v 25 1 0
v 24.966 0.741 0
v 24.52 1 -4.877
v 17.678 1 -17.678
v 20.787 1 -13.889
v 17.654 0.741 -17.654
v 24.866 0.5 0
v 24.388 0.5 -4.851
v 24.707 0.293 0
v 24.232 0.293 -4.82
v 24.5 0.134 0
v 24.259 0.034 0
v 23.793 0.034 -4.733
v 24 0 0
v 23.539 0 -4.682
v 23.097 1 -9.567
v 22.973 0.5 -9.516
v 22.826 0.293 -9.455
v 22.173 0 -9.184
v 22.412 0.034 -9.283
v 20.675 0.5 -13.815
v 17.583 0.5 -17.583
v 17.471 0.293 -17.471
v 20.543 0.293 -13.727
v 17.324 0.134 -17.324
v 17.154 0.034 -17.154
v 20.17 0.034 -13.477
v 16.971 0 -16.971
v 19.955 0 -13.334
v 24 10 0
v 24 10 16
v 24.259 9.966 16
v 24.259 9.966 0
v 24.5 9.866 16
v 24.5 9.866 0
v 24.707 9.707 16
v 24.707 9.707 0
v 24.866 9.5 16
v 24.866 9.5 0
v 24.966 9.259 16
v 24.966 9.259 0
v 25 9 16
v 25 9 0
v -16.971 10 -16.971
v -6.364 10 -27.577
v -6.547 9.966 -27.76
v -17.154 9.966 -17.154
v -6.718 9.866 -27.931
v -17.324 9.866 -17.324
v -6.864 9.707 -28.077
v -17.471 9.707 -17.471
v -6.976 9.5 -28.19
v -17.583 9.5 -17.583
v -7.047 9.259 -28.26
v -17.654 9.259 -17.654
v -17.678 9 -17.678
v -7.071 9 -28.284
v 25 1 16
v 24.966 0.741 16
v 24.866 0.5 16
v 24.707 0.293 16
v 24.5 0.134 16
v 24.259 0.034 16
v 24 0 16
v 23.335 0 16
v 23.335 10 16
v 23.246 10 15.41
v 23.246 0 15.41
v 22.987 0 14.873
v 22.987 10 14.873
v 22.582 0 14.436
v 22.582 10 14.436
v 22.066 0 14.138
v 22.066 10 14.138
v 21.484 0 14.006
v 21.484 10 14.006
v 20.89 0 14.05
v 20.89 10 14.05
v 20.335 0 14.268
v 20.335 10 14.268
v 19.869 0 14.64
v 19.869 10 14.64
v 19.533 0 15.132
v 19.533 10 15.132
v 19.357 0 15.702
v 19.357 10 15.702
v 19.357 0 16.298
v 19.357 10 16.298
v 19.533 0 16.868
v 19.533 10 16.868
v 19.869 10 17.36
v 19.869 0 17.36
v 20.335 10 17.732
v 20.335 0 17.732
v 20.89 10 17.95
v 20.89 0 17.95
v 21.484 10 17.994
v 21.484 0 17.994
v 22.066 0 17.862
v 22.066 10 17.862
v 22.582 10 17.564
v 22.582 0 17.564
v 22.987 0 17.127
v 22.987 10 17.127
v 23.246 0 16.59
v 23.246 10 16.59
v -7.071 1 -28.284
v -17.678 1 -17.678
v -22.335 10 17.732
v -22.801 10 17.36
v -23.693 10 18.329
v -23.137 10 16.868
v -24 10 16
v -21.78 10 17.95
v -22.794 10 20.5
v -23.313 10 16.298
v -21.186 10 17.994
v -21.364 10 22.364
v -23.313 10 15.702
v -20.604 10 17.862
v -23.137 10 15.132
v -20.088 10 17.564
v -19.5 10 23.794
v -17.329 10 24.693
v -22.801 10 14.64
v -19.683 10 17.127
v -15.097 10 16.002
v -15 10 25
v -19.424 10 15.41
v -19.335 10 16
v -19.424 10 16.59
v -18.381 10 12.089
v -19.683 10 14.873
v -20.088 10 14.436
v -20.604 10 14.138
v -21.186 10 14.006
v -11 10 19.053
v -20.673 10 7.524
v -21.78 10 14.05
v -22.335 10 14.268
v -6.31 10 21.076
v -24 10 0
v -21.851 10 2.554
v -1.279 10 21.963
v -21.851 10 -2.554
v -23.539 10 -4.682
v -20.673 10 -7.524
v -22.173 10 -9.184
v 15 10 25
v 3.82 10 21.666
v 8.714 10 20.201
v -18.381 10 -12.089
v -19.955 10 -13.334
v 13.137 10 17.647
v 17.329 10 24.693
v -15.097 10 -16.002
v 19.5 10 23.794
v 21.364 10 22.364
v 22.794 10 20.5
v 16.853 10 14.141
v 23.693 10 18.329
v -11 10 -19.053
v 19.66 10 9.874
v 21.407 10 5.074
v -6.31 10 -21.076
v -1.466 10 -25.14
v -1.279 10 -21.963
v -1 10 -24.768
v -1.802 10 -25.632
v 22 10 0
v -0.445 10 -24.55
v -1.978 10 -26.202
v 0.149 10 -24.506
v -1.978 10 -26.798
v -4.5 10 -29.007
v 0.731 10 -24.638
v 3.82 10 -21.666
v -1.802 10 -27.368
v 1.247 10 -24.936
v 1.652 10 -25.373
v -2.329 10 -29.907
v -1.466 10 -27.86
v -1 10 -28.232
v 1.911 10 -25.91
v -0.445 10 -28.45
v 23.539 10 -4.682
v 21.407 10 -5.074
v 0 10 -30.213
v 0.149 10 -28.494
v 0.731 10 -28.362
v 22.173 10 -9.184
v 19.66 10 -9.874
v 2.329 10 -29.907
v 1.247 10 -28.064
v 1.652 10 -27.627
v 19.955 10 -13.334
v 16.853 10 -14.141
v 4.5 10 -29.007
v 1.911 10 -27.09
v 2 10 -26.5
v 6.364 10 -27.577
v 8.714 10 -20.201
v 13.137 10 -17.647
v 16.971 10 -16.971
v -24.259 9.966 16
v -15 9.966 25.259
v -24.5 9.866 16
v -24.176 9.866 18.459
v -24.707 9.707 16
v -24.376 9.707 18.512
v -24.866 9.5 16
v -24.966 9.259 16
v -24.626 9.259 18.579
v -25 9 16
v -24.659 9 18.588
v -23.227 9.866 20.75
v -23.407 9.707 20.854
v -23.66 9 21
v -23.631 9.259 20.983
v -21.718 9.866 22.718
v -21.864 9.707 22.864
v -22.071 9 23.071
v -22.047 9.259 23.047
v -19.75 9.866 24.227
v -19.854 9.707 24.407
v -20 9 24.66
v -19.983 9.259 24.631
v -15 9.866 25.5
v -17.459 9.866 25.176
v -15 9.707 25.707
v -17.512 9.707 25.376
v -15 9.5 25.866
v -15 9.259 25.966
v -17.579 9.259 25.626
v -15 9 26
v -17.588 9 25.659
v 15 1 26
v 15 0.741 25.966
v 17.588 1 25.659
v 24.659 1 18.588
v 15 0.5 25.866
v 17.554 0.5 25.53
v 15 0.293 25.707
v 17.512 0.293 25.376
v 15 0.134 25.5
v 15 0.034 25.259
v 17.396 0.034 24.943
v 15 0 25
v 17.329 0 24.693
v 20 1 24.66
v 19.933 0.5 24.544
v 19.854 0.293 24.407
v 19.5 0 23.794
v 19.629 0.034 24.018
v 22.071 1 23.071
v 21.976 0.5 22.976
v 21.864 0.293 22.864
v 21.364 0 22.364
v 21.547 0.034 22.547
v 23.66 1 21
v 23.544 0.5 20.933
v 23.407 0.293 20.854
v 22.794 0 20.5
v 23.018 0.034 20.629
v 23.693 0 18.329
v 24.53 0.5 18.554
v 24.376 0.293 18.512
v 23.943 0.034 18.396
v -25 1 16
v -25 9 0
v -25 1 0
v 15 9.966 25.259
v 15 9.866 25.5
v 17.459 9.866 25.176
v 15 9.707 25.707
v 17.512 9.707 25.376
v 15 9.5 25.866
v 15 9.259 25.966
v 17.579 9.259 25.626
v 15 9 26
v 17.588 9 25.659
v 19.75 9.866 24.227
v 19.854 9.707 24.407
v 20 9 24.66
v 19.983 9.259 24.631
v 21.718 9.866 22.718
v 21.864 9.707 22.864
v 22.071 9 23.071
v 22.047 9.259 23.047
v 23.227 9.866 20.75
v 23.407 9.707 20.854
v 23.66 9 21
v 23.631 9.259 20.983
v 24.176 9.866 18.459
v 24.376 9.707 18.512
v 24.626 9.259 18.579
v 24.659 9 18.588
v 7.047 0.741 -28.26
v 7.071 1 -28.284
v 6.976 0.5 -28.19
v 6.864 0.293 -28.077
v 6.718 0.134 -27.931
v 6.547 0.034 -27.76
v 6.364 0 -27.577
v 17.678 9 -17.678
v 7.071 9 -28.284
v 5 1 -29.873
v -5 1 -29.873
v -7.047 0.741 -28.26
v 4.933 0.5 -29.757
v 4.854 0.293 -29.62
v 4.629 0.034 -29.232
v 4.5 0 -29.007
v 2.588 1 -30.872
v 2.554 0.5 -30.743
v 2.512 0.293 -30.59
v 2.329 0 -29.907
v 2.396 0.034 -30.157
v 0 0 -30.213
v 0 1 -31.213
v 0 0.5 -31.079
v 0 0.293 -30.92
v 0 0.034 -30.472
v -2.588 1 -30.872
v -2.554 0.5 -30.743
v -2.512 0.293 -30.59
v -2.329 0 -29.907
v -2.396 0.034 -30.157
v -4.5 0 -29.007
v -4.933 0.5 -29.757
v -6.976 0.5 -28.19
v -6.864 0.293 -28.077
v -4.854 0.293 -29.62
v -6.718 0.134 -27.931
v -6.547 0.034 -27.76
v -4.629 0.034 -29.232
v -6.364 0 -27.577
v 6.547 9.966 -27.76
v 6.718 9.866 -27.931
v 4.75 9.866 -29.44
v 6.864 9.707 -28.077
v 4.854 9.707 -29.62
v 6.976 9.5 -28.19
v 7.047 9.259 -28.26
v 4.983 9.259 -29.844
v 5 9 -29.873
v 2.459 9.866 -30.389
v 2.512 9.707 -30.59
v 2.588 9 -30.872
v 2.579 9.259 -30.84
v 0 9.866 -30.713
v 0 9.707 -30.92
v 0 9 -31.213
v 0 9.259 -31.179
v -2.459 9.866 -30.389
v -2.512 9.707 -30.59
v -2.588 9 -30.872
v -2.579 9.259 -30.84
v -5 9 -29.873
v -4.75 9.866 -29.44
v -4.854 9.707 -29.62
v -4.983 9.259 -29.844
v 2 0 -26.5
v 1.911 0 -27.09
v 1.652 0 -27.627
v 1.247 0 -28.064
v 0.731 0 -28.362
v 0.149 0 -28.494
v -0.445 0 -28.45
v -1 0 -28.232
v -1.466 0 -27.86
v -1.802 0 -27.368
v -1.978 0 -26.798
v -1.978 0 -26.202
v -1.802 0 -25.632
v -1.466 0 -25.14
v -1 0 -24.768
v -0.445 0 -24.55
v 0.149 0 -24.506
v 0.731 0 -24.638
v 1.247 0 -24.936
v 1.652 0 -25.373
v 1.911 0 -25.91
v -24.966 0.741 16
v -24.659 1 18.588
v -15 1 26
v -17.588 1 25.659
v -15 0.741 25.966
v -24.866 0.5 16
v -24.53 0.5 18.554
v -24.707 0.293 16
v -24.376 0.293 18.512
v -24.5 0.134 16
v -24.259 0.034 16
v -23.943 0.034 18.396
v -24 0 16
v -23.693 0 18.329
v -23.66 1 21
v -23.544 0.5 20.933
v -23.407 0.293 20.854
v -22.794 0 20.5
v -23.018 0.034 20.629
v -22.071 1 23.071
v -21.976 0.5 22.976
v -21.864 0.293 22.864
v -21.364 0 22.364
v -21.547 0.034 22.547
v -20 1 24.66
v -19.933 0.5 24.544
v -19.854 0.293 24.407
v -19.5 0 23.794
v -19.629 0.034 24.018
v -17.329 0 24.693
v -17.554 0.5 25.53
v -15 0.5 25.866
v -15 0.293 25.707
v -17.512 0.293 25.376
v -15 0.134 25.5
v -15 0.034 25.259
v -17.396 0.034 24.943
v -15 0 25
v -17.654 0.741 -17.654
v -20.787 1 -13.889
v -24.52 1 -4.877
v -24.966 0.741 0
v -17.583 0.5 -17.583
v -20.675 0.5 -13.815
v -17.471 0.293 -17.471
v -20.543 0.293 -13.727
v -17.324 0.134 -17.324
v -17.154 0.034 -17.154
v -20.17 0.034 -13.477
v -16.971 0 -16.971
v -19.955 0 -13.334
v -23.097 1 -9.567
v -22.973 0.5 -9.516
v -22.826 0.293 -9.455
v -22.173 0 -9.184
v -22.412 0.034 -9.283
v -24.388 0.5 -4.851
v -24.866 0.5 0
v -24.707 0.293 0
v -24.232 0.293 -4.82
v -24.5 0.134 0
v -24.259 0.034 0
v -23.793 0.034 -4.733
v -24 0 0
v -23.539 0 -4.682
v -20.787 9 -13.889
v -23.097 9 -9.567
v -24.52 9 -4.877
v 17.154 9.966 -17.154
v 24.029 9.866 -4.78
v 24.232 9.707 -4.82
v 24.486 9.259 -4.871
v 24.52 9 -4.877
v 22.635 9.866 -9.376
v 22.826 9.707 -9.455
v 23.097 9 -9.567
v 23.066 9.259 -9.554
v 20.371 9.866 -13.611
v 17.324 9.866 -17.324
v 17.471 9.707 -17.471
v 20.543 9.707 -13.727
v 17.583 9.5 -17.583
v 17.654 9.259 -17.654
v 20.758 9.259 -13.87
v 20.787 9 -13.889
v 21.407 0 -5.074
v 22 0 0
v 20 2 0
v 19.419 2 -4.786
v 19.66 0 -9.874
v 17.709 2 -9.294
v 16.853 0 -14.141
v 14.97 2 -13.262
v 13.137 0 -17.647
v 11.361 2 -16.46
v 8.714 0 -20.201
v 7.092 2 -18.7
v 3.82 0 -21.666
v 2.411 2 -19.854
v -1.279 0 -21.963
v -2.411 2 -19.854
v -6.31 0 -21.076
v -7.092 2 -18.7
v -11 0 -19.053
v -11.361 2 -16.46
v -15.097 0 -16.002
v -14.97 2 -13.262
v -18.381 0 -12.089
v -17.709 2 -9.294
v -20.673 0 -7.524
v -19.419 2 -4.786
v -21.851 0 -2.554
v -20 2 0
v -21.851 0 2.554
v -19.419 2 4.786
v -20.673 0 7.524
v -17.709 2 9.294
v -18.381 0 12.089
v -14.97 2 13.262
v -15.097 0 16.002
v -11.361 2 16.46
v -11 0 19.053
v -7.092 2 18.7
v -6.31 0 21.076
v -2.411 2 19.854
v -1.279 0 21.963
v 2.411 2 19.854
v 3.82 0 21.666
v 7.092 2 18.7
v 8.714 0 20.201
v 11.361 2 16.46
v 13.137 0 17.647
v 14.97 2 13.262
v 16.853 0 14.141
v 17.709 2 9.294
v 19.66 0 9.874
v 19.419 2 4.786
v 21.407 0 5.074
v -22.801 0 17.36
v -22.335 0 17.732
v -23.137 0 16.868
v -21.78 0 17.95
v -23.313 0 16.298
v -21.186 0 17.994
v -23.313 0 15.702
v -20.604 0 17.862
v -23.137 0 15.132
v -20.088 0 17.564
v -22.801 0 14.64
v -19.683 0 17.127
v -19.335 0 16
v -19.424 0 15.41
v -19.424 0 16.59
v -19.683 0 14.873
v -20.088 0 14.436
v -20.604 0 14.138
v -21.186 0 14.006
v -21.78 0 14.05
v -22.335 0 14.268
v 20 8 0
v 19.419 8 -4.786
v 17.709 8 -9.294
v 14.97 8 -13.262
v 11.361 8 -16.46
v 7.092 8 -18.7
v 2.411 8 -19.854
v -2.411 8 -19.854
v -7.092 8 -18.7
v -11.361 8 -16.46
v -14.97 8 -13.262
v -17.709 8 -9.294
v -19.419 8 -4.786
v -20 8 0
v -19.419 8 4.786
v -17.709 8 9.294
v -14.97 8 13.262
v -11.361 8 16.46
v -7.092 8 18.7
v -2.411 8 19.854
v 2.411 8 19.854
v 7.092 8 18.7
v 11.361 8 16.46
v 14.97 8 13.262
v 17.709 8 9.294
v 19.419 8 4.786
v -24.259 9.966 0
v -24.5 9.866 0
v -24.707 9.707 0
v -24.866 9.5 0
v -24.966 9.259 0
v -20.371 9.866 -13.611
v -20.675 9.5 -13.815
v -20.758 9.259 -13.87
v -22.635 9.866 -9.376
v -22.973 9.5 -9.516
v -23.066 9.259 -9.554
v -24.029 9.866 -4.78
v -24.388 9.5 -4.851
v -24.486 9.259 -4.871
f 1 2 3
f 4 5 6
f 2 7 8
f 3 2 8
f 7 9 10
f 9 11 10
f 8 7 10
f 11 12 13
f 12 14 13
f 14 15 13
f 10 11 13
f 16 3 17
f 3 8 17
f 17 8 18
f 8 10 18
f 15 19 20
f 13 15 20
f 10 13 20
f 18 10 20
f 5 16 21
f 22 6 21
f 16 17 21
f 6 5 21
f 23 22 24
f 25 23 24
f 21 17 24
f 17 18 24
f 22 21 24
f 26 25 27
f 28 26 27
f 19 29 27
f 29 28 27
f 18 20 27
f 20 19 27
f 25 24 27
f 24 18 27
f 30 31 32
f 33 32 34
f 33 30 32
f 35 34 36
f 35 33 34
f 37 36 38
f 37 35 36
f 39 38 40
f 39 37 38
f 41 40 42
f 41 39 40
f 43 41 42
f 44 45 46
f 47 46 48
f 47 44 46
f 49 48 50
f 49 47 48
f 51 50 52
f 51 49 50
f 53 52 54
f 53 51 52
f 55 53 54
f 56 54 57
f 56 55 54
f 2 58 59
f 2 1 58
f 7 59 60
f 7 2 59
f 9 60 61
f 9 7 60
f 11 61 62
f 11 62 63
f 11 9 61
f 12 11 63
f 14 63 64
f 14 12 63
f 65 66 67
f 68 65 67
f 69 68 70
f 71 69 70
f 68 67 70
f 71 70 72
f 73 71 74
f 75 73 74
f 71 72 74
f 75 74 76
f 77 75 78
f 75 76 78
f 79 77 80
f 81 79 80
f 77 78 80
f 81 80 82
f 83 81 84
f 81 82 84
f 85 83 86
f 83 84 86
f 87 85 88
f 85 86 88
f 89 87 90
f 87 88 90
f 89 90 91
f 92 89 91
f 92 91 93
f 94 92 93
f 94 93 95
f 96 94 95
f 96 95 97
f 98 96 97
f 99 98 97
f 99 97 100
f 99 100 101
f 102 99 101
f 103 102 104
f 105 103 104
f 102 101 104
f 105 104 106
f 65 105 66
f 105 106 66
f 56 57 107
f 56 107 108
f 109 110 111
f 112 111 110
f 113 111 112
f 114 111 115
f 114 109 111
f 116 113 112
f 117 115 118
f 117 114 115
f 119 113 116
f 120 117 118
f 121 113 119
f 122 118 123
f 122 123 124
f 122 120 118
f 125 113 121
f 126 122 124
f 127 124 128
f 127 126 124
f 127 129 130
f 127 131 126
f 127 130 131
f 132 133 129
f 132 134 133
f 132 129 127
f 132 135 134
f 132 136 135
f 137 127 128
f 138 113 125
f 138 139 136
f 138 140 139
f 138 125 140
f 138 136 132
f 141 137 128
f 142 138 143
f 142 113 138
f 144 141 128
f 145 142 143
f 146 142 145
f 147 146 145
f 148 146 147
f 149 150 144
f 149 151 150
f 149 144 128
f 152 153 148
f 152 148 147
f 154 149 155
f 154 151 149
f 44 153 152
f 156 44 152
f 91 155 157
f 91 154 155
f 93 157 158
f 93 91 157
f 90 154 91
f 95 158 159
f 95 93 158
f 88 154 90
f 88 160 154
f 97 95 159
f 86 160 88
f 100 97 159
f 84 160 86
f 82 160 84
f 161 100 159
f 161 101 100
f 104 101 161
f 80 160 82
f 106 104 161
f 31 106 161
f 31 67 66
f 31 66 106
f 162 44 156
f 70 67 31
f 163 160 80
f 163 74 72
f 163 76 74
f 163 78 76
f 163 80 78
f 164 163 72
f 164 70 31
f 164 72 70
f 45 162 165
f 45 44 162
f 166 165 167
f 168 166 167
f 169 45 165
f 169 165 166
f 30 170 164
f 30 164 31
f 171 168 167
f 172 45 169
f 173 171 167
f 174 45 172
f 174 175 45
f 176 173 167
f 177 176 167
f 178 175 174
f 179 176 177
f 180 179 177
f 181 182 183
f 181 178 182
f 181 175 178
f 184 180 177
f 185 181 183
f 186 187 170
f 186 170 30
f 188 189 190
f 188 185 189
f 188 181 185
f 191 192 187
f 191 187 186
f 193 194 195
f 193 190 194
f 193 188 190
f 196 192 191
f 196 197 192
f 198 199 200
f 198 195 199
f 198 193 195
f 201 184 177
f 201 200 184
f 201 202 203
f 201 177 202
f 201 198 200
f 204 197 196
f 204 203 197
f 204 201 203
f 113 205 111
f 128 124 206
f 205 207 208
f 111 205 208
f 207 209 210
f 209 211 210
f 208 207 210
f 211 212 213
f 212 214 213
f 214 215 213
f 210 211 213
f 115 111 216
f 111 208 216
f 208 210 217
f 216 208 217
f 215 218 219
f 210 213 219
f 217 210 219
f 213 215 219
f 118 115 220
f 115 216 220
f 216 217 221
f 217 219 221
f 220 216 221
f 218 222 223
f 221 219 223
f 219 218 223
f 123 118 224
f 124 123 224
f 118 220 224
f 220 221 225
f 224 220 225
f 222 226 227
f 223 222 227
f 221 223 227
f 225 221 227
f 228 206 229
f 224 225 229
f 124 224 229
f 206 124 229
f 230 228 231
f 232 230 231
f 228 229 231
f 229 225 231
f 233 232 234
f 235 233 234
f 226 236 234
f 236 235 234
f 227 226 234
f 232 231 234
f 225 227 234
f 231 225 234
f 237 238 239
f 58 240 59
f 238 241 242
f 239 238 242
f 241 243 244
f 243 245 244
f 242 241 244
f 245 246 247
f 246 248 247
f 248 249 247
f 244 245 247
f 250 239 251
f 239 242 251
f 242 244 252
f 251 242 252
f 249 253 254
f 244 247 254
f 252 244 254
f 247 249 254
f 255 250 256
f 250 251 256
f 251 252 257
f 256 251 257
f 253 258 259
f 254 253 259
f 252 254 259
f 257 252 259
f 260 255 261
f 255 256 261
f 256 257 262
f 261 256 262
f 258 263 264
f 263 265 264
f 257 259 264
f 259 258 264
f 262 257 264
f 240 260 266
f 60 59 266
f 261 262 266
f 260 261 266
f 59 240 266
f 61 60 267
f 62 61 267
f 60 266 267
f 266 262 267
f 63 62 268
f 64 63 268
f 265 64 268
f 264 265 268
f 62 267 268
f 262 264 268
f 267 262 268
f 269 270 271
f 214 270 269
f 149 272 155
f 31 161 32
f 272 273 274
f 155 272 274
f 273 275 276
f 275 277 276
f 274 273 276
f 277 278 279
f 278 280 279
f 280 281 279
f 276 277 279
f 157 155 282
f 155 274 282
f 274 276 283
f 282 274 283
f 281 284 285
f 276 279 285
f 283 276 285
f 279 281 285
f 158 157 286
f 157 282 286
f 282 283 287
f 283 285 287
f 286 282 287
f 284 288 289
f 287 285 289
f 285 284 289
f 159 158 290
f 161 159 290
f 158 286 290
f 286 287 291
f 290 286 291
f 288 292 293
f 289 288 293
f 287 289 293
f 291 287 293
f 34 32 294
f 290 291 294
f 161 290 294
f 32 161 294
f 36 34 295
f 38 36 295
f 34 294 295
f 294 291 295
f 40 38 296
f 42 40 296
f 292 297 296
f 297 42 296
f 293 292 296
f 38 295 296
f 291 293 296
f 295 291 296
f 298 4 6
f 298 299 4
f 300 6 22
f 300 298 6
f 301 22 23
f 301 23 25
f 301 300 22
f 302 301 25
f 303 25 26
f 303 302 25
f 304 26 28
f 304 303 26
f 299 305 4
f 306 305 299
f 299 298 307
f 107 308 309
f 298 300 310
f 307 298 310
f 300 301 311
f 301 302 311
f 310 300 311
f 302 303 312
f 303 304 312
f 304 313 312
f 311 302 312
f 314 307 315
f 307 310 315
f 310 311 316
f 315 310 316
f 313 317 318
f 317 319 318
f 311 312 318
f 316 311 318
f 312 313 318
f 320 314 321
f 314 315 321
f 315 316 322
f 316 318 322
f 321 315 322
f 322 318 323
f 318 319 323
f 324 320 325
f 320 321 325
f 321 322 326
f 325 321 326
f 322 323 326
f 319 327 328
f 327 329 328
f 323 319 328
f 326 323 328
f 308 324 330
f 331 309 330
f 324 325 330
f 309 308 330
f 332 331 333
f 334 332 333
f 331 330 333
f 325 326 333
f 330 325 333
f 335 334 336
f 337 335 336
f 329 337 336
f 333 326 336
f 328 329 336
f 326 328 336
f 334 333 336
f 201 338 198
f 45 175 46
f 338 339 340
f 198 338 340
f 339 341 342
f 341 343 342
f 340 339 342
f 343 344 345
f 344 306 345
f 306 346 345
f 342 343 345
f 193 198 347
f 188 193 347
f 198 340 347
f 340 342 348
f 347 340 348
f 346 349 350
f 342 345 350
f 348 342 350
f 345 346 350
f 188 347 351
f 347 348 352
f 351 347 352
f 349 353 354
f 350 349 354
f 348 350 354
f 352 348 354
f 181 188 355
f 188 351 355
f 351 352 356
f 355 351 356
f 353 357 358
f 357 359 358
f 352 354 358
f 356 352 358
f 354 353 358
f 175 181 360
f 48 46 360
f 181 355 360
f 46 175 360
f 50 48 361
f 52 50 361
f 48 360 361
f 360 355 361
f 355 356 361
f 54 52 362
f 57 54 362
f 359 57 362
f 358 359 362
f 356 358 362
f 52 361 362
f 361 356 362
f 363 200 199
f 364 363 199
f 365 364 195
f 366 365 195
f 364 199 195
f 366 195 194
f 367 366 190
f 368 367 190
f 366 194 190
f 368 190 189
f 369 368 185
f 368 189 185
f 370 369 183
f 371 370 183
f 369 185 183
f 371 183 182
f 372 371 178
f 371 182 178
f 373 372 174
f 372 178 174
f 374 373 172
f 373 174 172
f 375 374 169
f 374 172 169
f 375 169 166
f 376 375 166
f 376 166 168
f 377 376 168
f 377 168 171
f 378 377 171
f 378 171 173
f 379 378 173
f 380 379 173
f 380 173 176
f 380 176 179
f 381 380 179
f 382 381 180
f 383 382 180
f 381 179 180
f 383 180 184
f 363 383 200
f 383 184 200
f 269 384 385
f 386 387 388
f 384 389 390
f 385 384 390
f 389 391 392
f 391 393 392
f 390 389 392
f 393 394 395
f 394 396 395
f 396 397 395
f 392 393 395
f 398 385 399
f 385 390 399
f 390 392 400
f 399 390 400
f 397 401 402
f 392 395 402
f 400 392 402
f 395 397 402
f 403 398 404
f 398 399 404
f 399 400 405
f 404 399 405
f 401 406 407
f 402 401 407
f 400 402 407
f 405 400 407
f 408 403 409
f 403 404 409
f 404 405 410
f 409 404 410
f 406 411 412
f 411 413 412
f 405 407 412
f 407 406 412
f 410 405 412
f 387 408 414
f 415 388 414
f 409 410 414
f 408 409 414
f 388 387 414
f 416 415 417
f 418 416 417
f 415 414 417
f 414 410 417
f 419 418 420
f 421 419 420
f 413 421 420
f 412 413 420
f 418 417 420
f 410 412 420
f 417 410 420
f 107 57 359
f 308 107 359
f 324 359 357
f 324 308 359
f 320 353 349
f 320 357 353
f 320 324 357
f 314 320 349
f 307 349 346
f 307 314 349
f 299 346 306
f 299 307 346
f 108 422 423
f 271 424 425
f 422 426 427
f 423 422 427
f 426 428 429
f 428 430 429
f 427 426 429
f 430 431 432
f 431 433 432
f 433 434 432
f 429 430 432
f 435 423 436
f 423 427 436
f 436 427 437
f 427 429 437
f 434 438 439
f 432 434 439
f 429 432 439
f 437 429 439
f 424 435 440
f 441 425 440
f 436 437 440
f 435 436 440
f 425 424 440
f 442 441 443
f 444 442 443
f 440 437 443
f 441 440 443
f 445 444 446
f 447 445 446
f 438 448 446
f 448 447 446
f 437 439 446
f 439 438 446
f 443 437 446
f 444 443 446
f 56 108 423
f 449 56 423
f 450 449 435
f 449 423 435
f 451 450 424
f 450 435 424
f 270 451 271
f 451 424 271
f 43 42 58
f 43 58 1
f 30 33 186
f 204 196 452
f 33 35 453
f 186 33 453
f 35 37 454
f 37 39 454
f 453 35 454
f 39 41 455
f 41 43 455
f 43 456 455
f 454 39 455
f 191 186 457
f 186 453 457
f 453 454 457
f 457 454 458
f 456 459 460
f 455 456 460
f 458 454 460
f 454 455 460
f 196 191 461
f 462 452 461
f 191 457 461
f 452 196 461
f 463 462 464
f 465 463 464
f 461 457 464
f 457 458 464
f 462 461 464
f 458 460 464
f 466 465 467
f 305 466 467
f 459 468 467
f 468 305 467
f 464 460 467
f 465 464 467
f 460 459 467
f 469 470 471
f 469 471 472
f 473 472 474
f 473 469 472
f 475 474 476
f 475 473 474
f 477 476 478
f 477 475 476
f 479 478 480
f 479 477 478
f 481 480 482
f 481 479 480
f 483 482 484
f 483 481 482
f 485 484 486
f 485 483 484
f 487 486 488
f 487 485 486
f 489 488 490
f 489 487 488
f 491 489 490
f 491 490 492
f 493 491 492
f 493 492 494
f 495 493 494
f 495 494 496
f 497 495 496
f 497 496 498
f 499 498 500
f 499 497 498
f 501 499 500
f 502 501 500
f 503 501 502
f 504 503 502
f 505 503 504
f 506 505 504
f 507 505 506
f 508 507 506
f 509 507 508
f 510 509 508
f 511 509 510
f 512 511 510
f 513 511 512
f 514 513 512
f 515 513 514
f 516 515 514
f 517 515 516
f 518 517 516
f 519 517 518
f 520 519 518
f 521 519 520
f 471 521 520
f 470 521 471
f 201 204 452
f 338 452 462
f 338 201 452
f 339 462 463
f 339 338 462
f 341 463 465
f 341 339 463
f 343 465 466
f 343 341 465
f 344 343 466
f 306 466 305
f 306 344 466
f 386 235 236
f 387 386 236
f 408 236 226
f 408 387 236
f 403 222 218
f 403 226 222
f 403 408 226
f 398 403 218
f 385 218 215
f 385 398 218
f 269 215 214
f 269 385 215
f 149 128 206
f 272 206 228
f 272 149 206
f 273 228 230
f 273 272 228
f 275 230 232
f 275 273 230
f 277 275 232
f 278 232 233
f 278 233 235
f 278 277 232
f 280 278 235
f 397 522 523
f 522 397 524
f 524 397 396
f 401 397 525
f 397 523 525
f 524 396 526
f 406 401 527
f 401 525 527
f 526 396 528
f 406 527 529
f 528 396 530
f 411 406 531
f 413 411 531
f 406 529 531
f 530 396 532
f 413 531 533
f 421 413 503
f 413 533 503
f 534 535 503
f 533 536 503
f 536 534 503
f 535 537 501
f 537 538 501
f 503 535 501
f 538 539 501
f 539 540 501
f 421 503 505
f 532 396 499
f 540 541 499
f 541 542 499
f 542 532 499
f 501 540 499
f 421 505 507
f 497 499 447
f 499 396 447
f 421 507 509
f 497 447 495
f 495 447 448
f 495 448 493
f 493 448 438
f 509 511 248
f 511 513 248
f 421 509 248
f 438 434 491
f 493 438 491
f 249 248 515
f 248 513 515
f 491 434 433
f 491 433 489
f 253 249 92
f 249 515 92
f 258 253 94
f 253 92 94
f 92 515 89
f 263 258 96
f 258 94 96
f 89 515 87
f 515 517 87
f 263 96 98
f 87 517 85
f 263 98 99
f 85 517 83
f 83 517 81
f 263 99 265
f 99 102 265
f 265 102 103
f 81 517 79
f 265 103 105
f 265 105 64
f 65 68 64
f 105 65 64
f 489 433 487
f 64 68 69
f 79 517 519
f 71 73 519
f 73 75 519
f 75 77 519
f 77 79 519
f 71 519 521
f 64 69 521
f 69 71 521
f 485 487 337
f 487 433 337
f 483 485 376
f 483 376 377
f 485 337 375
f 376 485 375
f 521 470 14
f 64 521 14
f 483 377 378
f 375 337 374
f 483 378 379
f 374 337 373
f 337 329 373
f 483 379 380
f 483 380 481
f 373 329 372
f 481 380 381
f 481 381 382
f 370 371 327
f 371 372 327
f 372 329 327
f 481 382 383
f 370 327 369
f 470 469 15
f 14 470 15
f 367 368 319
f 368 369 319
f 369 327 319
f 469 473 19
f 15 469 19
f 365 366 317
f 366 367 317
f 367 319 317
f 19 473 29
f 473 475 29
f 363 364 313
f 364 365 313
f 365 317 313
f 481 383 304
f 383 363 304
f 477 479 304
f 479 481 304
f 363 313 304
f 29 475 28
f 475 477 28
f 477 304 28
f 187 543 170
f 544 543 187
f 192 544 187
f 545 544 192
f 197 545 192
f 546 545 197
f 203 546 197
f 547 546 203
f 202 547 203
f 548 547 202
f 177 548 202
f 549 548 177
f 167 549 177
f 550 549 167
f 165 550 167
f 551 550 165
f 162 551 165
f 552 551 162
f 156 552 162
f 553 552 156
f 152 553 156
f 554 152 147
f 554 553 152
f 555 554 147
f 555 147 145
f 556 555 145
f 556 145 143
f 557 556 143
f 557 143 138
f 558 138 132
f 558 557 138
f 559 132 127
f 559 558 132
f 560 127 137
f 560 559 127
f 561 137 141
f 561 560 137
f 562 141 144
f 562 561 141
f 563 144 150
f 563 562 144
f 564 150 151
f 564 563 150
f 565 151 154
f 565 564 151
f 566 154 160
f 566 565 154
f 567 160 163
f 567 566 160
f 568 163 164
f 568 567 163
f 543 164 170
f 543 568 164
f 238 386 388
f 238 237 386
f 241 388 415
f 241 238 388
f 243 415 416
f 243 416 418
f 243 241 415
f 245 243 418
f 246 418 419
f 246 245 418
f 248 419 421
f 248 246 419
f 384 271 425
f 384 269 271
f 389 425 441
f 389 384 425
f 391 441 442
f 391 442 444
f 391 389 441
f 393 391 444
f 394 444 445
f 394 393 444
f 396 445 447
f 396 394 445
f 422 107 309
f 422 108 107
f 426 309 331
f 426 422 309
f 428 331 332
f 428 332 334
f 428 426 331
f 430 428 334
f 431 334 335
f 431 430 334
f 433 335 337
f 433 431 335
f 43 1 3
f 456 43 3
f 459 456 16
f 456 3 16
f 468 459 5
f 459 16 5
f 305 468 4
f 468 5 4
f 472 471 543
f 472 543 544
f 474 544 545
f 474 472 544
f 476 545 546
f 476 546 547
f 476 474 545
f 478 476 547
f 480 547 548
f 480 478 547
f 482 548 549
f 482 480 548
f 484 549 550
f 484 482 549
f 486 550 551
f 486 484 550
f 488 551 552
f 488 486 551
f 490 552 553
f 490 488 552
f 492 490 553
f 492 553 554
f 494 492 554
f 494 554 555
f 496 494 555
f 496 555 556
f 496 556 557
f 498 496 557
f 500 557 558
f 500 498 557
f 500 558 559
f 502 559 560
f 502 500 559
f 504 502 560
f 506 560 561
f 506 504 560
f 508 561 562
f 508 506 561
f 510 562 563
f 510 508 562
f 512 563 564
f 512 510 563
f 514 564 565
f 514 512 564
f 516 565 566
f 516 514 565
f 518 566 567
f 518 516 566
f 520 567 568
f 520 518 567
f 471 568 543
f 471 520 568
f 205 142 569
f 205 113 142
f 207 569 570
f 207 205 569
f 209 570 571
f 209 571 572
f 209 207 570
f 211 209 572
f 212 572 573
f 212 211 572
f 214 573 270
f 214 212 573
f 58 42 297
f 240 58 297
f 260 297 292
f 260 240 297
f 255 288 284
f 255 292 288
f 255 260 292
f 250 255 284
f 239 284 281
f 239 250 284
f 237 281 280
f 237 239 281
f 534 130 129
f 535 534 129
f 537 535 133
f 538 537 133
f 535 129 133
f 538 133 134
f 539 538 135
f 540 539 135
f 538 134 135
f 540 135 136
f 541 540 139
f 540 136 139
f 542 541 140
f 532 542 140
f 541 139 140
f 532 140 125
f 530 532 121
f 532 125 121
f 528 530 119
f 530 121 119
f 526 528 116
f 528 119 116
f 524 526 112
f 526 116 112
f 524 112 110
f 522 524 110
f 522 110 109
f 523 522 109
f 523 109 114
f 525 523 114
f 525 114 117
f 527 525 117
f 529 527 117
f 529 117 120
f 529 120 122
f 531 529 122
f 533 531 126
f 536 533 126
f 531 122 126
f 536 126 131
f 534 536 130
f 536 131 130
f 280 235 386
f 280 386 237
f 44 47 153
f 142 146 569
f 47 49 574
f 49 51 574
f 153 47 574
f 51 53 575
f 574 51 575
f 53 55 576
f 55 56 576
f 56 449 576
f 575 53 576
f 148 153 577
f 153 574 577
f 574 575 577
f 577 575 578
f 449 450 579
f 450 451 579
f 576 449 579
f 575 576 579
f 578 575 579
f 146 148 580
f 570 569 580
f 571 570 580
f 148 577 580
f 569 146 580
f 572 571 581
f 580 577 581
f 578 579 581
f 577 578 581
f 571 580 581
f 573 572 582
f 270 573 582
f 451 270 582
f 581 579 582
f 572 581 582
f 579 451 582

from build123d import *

# Parameters (mm, degrees)
SKETCH1_R           = 25
SKETCH1_R_2         = 20
BOSS_EXTRUDE1_DEPTH = 10
BOSS_EXTRUDE2_DEPTH = 10
BOSS_EXTRUDE3_DEPTH = 10
FILLET1_R           = 10
SKETCH2_R           = 2
CUT_EXTRUDE1_DEPTH  = 10
CHAMFER1_SIZE       = 2
FILLET2_R           = 10
CHAMFER2_SIZE       = 2
FILLET3_R           = 1


with BuildPart() as part:
    # Sketch1 → Boss-Extrude1 (new body)
    with BuildSketch(Plane(origin=(0, 0, 0), x_dir=(1, 0, 0), z_dir=(0, 1, 0))):
        Circle(SKETCH1_R)
        Circle(SKETCH1_R_2, mode=Mode.SUBTRACT)
    extrude(amount=BOSS_EXTRUDE1_DEPTH)

    # Sketch3 → Boss-Extrude2 (add)
    with BuildSketch(Plane(origin=(0, 10, 0), x_dir=(1, 0, 0), z_dir=(0, 1, 0))):
        with BuildLine():
            Line((-25, -26), (25, -26))
            Line((25, -26), (25, 0))
            ThreePointArc((25, 0), (0, -25), (-25, 0))
            Line((-25, 0), (-25, -26))
        make_face()
    extrude(amount=-BOSS_EXTRUDE2_DEPTH)

    # Sketch4 → Boss-Extrude3 (add)
    with BuildSketch(Plane(origin=(0, 10, 0), x_dir=(1, 0, 0), z_dir=(0, 1, 0))):
        with BuildLine():
            Line((0, 35.355339059), (-17.67766953, 17.67766953))
            ThreePointArc((-17.67766953, 17.67766953), (0, 25), (17.67766953, 17.67766953))
            Line((17.67766953, 17.67766953), (0, 35.355339059))
        make_face()
    extrude(amount=-BOSS_EXTRUDE3_DEPTH)

    # Fillet1
    fillet1_edges = [part.edges().sort_by_distance(p)[0] for p in [
        (0, 5, -35.355339059),
    ]]
    fillet(fillet1_edges, radius=FILLET1_R)

    # Sketch2 → Cut-Extrude1 (cut)
    with BuildSketch(Plane(origin=(0, 10, 0), x_dir=(1, 0, 0), z_dir=(0, 1, 0))):
        with Locations((-21.335, -16)):
            Circle(SKETCH2_R)
        with Locations((0, 26.5)):
            Circle(SKETCH2_R)
        with Locations((21.335, -16)):
            Circle(SKETCH2_R)
    extrude(amount=-CUT_EXTRUDE1_DEPTH, mode=Mode.SUBTRACT)

    # Chamfer1
    chamfer1_edges = [part.edges().sort_by_distance(p)[0] for p in [
        (-20, 0, 0),
    ]]
    chamfer(chamfer1_edges, length=CHAMFER1_SIZE)

    # Fillet2
    fillet2_edges = [part.edges().sort_by_distance(p)[0] for p in [
        (-25, 5, 26),
        (25, 5, 26),
    ]]
    fillet(fillet2_edges, radius=FILLET2_R)

    # Chamfer2
    chamfer2_edges = [part.edges().sort_by_distance(p)[0] for p in [
        (-20, 10, 0),
    ]]
    chamfer(chamfer2_edges, length=CHAMFER2_SIZE)

    # Fillet3
    fillet3_edges = [part.edges().sort_by_distance(p)[0] for p in [
        (-25, 0, 8),
        (-25, 10, 8),
        (23.096988313, 0, -9.567085809),
        (-23.096988313, 0, -9.567085809),
        (-23.096988313, 10, -9.567085809),
        (-12.374368671, 10, -22.980970389),
        (-12.374368671, 0, -22.980970389),
        (12.374368671, 10, -22.980970389),
        (12.374368671, 0, -22.980970389),
        (0, 10, -31.213203436),
        (0, 0, -31.213203436),
        (23.096988313, 10, -9.567085809),
        (0, 10, 26),
        (0, 0, 26),
        (25, 10, 8),
        (-22.071067812, 10, 23.071067812),
        (22.071067812, 10, 23.071067812),
        (25, 0, 8),
        (-22.071067812, 0, 23.071067812),
        (22.071067812, 0, 23.071067812),
    ]]
    fillet(fillet3_edges, radius=FILLET3_R)


solid = part.part
